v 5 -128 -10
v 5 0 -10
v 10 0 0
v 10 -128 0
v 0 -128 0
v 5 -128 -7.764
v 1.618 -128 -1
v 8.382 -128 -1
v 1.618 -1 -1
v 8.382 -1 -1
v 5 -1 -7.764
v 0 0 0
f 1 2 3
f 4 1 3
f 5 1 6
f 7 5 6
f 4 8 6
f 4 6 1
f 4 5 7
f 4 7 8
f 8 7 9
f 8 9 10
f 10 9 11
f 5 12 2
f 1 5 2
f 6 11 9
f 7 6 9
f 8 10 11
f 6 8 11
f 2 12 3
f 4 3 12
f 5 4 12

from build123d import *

# Parameters (mm, degrees)
F1_DEPTH = 1
F2_DEPTH = 128


with BuildPart() as f1:
    # F0 (on Front) → F1 (new body)
    with BuildSketch(Plane.XZ):
        Polygon((5, -1), (1.618034, -1), (5, -7.763932), (8.381966, -1), align=None)
    extrude(amount=F1_DEPTH)

    # F0 (on Front) → F2 (join)
    with BuildSketch(Plane.XZ):
        Polygon((5, 0), (0, 0), (5, -10), (10, 0), align=None)
        Polygon((5, -7.763932), (1.618034, -1), (5, -1), (8.381966, -1), align=None, mode=Mode.SUBTRACT)
    extrude(amount=F2_DEPTH)


solid = f1.part
